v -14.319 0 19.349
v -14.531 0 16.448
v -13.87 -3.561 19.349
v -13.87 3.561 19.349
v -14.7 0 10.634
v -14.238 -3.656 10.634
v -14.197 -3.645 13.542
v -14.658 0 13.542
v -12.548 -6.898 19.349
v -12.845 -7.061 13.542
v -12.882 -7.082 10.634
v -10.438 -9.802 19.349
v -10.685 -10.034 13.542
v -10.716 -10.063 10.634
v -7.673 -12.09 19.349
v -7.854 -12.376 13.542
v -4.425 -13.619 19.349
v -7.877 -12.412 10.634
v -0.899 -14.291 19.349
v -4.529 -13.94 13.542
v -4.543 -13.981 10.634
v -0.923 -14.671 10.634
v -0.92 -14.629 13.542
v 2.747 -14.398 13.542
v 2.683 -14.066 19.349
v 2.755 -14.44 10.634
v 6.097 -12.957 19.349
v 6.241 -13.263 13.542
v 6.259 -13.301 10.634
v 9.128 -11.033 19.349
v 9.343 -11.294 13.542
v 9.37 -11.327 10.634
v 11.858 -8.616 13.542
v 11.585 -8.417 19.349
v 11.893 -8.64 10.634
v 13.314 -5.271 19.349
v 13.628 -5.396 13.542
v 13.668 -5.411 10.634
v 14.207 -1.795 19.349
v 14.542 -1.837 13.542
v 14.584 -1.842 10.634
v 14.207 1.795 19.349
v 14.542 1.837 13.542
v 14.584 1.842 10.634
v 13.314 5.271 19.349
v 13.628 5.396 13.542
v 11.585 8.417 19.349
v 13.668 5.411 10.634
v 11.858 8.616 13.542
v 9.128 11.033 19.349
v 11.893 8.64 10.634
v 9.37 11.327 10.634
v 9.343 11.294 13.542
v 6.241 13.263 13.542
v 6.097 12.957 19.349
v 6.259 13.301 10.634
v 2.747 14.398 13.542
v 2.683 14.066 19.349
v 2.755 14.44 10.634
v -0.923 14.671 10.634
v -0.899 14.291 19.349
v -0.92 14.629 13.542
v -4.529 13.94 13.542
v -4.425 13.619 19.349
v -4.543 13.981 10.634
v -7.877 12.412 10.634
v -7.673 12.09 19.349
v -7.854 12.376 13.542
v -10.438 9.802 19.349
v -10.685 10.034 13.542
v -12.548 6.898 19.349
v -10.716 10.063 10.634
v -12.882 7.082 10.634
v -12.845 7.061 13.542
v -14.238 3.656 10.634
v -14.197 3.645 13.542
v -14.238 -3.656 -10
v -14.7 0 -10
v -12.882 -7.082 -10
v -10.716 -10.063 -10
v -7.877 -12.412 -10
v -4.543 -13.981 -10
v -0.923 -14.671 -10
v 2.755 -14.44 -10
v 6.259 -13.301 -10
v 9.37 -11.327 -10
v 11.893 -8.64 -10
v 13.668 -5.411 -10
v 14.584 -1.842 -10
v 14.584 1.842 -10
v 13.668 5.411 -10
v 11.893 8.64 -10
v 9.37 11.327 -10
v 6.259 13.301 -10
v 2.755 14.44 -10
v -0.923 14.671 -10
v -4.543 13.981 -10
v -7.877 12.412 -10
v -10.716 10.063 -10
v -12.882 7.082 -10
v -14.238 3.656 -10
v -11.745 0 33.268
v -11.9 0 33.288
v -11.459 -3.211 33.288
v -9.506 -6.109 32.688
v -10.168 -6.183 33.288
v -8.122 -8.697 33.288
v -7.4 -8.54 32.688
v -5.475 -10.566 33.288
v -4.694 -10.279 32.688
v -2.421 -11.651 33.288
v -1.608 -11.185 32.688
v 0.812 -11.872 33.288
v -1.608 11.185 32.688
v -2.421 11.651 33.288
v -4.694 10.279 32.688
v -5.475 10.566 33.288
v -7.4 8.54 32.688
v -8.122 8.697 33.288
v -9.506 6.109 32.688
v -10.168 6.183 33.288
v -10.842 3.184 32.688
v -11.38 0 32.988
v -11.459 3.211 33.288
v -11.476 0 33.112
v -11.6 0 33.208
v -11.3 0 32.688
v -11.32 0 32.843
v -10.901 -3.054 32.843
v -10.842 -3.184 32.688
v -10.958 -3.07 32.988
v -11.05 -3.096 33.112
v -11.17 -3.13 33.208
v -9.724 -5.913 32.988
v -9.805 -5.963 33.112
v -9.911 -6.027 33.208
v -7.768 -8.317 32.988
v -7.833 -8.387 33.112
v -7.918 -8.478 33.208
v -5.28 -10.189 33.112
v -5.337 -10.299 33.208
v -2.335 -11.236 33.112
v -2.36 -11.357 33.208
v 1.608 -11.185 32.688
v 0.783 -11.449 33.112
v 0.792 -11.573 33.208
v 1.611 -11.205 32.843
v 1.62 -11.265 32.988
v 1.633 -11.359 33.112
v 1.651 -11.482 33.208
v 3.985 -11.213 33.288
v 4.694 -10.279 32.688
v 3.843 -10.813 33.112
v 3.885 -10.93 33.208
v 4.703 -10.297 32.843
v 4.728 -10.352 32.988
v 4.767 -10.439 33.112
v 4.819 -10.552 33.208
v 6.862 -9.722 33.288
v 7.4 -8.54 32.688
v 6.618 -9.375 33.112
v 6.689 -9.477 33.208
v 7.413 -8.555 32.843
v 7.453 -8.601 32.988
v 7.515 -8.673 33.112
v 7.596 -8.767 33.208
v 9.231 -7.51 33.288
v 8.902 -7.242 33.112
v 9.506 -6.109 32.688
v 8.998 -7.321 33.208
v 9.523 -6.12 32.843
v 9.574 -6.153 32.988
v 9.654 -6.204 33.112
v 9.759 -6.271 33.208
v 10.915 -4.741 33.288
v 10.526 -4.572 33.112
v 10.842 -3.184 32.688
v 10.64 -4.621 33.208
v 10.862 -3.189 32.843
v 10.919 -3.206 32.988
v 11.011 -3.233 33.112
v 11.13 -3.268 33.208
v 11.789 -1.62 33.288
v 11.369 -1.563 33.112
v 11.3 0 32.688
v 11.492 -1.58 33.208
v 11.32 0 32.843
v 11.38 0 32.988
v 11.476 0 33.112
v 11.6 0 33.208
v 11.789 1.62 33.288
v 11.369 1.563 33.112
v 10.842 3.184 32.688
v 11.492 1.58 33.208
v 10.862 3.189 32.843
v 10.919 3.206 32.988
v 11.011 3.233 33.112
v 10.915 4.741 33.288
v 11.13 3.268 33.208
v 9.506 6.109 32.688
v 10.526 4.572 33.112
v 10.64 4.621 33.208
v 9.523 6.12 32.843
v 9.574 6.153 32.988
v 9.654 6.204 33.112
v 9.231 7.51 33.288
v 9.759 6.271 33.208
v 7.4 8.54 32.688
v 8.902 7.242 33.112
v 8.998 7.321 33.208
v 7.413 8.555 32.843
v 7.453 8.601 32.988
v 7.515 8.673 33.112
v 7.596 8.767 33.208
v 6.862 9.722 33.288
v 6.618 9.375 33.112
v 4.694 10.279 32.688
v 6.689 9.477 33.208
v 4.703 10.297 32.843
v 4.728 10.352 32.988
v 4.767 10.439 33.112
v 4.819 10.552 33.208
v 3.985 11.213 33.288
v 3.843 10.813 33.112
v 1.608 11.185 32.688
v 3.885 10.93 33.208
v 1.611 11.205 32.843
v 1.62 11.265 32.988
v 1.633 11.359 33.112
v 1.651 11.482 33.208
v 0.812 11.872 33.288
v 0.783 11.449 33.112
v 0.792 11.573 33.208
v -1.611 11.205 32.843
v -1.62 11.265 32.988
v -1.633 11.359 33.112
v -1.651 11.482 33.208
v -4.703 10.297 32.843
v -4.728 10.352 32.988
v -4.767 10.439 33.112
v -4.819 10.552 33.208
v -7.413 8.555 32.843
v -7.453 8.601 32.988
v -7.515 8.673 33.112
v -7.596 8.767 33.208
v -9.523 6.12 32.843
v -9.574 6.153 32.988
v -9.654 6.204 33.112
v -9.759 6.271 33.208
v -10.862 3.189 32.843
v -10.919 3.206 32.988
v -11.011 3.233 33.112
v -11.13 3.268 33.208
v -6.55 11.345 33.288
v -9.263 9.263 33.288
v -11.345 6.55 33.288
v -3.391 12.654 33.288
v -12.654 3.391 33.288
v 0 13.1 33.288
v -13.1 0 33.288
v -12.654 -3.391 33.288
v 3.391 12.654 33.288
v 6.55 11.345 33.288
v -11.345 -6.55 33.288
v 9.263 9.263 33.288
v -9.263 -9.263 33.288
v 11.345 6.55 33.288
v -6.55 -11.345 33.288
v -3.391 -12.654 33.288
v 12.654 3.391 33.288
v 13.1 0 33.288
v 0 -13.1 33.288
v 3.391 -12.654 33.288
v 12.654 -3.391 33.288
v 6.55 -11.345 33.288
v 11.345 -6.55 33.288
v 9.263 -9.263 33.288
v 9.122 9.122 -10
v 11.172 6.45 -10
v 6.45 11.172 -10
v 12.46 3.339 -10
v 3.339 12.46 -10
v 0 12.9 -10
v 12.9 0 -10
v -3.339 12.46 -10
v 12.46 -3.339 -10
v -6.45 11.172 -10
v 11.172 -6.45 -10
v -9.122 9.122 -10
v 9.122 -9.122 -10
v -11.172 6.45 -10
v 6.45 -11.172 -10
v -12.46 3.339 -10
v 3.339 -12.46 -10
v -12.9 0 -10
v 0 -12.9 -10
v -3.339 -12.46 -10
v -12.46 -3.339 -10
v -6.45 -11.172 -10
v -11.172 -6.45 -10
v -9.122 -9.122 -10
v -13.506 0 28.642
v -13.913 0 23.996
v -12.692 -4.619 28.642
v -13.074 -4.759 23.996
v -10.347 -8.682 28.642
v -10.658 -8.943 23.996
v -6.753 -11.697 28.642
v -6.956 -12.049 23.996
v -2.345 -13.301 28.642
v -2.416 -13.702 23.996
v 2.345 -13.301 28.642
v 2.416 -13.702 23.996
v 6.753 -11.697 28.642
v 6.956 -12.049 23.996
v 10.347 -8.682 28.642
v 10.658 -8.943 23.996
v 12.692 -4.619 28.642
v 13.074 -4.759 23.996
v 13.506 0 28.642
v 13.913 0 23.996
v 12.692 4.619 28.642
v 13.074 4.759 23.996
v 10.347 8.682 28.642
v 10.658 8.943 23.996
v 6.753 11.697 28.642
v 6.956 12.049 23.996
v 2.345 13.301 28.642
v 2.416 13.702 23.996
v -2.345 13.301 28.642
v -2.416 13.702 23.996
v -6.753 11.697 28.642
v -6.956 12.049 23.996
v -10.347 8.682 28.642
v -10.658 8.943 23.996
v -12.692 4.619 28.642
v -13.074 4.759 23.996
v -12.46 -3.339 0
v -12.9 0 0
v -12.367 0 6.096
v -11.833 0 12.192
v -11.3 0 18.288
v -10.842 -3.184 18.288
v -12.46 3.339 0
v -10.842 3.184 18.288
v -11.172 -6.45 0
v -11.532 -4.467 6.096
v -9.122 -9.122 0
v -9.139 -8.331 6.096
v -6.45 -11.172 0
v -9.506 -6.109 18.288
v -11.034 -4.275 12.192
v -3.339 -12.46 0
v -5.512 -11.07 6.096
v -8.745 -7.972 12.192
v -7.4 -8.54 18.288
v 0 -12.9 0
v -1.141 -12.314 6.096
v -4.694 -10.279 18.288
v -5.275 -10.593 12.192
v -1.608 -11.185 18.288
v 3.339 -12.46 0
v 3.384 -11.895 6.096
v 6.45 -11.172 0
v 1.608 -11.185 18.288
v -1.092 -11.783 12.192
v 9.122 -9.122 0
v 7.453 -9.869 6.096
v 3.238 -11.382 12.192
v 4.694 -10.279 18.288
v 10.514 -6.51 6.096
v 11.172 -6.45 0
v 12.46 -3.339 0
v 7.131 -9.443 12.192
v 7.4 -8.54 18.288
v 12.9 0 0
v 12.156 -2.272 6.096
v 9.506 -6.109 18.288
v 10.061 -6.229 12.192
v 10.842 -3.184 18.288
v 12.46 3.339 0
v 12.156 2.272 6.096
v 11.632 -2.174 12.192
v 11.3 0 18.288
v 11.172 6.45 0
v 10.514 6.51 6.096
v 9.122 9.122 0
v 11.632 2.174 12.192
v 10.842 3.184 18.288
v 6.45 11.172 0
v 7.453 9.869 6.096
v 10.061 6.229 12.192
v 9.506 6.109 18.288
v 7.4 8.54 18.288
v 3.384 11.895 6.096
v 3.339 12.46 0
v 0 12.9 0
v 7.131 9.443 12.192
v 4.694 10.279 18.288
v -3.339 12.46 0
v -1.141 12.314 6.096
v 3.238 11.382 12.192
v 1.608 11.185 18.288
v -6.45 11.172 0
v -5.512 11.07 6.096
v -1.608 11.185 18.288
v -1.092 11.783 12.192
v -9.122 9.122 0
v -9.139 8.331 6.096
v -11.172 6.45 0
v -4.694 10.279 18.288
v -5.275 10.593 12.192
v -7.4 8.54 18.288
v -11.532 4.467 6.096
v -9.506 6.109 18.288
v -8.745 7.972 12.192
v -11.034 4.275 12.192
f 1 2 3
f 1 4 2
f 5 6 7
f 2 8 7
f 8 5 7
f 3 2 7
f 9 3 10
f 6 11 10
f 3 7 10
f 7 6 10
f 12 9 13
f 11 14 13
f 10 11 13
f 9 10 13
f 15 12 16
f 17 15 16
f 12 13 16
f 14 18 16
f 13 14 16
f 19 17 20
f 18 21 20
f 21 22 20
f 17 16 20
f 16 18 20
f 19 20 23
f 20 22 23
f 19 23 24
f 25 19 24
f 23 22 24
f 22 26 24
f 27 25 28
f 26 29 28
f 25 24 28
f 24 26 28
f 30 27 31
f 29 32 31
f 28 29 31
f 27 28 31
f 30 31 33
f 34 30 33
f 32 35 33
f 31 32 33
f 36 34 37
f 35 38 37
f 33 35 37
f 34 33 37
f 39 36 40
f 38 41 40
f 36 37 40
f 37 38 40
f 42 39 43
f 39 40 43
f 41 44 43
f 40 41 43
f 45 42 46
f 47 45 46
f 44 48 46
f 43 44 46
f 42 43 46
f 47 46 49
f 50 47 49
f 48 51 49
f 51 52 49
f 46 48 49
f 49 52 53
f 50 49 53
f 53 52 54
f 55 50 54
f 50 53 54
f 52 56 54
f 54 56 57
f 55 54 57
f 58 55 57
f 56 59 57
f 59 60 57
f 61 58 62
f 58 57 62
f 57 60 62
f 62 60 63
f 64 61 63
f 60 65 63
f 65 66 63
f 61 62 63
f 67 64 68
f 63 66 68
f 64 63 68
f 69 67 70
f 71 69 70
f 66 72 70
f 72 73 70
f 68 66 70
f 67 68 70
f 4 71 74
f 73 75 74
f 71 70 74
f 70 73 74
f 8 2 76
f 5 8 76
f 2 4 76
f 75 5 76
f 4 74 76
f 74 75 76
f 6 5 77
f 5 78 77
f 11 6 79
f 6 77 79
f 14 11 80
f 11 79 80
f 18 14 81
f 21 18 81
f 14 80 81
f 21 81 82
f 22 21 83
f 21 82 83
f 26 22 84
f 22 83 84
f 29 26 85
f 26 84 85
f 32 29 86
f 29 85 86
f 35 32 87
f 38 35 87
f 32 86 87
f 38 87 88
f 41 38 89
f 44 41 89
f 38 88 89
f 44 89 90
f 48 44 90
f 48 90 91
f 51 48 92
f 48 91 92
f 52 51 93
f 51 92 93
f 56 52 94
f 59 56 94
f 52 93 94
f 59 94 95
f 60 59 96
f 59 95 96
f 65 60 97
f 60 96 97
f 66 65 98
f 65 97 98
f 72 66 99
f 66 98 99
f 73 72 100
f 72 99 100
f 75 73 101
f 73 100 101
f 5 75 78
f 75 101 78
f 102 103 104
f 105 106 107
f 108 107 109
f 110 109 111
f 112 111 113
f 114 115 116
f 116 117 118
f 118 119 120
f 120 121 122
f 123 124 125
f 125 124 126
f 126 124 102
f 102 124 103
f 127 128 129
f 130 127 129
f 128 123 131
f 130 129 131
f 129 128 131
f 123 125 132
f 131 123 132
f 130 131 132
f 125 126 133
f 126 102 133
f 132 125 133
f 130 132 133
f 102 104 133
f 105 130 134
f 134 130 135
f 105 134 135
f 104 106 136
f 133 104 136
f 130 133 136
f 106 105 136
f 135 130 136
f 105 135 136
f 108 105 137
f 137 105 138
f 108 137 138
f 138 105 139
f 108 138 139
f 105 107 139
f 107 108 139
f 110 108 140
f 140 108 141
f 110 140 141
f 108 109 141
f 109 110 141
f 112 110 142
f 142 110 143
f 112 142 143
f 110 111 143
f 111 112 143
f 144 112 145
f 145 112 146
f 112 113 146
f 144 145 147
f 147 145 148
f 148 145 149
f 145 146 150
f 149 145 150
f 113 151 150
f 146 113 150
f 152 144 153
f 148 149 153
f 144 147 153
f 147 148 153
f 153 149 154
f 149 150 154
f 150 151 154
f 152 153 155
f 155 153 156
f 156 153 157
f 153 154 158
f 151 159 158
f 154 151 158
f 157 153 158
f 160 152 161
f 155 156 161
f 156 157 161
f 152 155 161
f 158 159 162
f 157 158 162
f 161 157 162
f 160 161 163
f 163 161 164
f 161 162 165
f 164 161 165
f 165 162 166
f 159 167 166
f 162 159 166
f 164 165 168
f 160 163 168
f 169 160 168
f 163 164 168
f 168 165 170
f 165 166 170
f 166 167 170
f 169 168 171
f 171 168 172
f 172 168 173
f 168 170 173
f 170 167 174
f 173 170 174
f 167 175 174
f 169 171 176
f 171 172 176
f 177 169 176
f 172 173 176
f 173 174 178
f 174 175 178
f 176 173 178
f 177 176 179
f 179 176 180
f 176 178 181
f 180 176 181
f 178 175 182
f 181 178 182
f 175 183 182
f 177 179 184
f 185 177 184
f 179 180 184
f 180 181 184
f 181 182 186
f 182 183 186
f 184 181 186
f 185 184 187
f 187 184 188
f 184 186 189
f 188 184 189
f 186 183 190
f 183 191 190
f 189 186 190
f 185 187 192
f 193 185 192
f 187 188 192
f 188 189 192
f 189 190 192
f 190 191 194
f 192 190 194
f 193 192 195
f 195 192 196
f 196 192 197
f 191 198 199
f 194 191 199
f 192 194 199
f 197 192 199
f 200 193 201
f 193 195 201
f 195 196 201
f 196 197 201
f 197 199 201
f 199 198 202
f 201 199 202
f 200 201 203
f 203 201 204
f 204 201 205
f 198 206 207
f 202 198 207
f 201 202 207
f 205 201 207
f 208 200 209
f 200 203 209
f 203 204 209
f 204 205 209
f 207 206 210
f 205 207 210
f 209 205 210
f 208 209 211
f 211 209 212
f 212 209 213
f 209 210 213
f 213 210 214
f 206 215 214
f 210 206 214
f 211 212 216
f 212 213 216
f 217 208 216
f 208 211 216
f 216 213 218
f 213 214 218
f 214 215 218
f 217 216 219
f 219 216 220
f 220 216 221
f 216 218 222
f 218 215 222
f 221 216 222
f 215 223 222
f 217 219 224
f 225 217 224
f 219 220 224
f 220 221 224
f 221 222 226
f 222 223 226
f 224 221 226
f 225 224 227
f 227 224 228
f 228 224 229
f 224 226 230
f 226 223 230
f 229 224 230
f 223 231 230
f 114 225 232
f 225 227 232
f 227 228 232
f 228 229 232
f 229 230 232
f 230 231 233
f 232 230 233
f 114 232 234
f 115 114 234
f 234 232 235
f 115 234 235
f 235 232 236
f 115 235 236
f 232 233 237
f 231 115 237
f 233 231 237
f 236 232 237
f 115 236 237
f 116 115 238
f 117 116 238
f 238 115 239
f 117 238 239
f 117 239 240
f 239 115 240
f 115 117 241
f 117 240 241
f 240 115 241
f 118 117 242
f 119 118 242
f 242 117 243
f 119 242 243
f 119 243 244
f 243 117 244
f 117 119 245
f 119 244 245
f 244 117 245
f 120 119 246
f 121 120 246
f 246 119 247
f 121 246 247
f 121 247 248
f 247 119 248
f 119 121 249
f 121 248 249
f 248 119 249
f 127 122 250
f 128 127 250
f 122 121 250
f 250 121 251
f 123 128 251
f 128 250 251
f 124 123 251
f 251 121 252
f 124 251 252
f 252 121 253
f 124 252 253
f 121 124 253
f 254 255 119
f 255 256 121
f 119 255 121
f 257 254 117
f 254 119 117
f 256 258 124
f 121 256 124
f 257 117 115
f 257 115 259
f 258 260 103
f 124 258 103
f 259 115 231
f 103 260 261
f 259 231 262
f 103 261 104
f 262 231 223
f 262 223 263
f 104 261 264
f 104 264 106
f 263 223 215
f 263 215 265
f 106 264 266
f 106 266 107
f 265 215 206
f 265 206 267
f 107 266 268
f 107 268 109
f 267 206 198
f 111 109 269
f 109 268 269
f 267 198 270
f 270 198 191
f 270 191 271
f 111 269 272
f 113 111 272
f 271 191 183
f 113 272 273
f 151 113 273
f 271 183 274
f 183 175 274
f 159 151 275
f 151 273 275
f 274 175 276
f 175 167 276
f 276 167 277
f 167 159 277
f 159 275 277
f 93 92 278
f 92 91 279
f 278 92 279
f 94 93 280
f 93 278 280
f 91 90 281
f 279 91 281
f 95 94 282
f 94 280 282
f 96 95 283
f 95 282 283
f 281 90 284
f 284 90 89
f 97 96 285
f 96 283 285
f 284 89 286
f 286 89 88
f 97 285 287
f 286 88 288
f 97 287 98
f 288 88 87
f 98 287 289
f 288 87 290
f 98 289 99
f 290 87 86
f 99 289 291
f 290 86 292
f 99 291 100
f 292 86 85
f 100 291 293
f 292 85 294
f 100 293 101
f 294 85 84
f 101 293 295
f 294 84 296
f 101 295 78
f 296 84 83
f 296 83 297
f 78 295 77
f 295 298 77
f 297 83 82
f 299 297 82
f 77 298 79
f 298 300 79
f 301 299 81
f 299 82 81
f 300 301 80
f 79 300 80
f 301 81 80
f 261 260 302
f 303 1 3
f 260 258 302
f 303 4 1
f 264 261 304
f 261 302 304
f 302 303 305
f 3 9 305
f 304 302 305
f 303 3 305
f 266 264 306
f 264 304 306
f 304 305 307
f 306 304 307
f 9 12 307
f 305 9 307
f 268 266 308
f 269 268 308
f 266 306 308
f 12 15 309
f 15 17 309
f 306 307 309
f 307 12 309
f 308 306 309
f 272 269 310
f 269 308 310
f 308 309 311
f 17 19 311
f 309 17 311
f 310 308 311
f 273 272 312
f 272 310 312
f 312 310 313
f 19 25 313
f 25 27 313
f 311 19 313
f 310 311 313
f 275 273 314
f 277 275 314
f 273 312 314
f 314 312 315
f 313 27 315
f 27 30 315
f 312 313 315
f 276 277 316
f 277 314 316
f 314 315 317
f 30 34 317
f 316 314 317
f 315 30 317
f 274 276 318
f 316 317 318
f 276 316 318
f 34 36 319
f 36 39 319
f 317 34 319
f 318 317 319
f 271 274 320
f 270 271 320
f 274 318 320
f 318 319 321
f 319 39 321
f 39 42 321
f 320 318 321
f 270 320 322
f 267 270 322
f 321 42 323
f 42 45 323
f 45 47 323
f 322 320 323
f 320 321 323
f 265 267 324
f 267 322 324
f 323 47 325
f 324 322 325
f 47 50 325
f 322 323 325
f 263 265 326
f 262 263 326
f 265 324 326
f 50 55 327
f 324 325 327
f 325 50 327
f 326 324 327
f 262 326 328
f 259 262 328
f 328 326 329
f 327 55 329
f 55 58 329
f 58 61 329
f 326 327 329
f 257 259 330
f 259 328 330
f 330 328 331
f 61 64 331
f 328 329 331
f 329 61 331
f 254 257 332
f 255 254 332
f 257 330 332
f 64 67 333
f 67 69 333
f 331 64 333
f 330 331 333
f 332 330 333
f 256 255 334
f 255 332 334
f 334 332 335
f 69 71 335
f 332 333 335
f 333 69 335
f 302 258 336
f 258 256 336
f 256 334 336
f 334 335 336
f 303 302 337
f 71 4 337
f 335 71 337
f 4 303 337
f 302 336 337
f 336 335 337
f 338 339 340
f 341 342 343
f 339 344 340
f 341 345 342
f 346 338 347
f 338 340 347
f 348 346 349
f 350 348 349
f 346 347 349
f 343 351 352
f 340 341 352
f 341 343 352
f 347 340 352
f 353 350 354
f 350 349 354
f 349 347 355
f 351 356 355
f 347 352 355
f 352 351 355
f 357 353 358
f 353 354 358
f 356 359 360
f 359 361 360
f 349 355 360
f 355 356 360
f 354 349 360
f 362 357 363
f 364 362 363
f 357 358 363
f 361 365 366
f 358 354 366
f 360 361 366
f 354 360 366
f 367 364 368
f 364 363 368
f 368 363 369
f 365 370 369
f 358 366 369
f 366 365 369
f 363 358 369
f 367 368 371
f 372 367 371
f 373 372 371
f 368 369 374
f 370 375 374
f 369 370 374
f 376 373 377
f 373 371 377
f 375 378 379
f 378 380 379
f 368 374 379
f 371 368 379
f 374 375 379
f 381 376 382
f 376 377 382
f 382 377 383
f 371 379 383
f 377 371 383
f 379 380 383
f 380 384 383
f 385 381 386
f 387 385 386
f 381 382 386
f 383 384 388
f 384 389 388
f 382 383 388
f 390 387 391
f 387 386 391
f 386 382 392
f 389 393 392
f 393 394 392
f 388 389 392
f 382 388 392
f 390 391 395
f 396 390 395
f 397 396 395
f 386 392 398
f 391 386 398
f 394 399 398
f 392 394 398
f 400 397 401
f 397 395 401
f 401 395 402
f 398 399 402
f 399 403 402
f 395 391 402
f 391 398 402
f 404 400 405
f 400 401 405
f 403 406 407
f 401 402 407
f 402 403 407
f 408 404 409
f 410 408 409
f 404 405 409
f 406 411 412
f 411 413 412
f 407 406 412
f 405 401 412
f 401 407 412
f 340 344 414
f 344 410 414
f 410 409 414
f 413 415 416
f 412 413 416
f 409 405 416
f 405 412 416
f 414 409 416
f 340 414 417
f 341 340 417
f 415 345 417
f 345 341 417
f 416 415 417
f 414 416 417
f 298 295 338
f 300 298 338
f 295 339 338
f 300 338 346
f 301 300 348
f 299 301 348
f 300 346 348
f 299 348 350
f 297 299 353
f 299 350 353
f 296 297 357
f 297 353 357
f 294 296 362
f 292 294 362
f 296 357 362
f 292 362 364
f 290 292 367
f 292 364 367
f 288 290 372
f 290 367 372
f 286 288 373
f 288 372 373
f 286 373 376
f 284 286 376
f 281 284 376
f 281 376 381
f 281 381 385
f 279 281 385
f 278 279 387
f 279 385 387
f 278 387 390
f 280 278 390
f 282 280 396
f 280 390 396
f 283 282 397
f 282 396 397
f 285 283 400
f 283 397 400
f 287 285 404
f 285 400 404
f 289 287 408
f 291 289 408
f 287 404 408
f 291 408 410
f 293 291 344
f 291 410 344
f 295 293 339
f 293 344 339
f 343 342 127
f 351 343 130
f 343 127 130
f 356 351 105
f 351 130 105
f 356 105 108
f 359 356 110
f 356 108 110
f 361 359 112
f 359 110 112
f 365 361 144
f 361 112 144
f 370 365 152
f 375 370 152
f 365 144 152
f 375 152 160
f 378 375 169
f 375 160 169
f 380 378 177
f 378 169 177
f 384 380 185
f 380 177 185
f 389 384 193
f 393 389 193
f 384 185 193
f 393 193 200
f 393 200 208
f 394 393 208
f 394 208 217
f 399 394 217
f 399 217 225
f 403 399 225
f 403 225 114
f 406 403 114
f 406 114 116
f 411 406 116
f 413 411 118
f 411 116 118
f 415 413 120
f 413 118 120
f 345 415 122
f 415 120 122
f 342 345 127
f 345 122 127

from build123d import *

# Parameters (mm, degrees)
F2_R = 0.6


# Not quite as in the source:
# - a fillet or chamfer that OpenCascade refuses, or shapes differently, is made with other operations: its cross-section is extruded or revolved along the edge and cut away or added


with BuildPart() as f1:
    # F0 (on Front) → F1 (revolve)
    with BuildSketch(Plane.XZ):
        Polygon((-14.7, 15), (-14.7, 0), (-14.7, -10), (-12.9, -10), (-12.9, 0), (-11.3, 18.2880836844), (-11.3, 33.2880836844), (-13.1, 33.2880836844), align=None)
    revolve(axis=Axis((0, 0, 16.6440418422), (0, 0, 1)))

    # F2
    f2_edges = [f1.edges().sort_by_distance(p)[0] for p in [
        (11.3, 0, 33.288084),
    ]]
    fillet(f2_edges, radius=F2_R)

    # F3: fillet of radius 100 on 1 edges, made by hand

    # F3_s1 → F3_t2 (revolve, cut)
    with BuildSketch(Plane.XZ):
        with BuildLine():
            ThreePointArc((-14.3194698092, 19.3494799839), (-14.6048221582, 14.9958444457), (-14.7, 10.6339057091))
            Line((-14.7, 10.6339057091), (-14.7, 15))
            Line((-14.7, 15), (-14.3194698092, 19.3494799839))
        make_face()
    revolve(axis=Axis((0, 0, 15), (0, 0, 1)), mode=Mode.SUBTRACT)


solid = f1.part
